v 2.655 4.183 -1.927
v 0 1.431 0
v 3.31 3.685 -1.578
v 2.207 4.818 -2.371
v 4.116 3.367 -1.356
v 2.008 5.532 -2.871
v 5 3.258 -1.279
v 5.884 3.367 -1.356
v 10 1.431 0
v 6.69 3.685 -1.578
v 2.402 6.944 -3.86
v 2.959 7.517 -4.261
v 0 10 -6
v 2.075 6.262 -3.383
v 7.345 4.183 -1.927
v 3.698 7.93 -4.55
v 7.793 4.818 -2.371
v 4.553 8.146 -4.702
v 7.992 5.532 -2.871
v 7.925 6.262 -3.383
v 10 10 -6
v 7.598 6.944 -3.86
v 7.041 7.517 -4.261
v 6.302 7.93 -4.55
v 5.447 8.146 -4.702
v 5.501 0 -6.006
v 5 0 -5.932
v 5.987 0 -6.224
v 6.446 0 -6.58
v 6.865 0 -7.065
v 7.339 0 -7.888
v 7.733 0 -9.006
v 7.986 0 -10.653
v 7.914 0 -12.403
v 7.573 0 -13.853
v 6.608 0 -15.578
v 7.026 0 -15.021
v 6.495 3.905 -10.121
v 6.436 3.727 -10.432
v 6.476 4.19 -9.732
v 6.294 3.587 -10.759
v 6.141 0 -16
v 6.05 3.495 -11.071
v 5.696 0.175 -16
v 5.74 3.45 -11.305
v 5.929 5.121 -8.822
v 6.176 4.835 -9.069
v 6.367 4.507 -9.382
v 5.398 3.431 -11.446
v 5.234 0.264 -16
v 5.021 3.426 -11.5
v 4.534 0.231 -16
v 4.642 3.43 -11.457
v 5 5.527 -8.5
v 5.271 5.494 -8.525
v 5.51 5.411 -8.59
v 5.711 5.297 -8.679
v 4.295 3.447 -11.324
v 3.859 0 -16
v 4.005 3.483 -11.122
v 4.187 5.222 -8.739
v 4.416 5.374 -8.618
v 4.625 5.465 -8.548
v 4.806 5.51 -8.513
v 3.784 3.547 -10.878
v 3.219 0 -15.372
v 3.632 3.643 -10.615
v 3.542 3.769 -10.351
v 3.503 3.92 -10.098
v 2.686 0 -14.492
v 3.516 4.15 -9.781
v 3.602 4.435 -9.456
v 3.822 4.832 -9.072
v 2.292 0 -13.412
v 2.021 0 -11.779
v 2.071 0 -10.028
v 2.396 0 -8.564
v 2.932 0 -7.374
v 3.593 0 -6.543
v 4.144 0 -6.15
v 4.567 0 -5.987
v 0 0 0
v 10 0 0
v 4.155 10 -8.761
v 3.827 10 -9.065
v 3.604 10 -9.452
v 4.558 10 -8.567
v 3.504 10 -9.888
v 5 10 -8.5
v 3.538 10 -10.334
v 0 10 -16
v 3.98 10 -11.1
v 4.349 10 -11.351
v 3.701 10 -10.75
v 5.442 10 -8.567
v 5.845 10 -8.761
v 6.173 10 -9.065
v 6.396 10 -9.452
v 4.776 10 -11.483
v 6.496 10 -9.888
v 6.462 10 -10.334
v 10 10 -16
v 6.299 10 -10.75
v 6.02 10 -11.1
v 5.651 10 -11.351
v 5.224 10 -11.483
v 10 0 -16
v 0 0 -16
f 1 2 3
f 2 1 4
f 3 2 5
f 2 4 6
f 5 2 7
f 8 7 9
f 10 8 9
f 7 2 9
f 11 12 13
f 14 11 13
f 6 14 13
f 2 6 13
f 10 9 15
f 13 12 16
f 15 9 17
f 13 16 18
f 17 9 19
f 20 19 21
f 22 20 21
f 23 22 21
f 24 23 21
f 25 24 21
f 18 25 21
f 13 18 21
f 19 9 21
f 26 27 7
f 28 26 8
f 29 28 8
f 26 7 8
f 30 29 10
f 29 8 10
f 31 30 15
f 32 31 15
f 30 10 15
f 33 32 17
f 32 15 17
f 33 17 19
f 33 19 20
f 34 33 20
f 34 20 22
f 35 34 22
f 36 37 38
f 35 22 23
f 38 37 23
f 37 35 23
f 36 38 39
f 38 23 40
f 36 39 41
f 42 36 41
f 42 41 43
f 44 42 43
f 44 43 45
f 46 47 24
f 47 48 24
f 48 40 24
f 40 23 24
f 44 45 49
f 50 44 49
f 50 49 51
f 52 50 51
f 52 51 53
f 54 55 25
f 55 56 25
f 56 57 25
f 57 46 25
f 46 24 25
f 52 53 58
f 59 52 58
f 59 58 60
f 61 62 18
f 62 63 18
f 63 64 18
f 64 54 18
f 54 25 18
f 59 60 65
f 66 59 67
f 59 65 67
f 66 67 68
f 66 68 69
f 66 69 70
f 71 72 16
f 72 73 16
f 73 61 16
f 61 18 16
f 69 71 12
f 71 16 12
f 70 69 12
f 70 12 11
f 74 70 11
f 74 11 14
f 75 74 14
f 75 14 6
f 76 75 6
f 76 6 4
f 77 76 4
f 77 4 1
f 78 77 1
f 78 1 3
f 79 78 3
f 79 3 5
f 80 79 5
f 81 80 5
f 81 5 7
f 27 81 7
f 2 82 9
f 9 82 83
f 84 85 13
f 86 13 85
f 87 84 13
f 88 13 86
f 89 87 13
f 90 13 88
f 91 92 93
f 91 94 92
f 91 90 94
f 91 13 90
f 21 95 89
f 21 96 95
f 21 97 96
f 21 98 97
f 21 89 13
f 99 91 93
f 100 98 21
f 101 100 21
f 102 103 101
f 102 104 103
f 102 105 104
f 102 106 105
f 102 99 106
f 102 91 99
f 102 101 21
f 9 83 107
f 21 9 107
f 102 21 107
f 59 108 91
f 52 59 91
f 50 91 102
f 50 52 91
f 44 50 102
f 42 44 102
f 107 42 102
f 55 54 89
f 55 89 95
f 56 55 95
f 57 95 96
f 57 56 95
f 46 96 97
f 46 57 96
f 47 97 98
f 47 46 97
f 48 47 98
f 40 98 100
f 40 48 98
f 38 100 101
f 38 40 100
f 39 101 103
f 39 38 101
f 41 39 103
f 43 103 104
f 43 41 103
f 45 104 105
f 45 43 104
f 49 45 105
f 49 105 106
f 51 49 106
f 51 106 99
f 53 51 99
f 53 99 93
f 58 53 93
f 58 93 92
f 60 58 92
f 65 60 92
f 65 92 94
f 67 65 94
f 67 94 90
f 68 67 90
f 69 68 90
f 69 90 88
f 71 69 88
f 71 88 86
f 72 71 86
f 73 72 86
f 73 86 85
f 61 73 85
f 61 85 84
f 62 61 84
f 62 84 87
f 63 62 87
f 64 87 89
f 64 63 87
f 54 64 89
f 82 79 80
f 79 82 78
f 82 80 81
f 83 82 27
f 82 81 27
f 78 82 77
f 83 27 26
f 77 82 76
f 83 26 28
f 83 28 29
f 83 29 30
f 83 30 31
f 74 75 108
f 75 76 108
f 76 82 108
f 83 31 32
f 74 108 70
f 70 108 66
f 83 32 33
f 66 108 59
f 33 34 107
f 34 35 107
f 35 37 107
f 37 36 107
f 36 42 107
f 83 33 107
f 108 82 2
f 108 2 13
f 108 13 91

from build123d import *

# Parameters (mm, degrees)
SKETCH_1_W          = 10
SKETCH_1_H          = 16
SKETCH_1_R          = 1.5
EXTRUDE_1_DEPTH     = 10
CUT_EXTRUDE_1_DEPTH = 10
SKETCH_3_R          = 3
CUT_EXTRUDE_2_DEPTH = 22.65119524


with BuildPart() as part:
    # 草图1 → 凸台-拉伸1 (new body)
    with BuildSketch(Plane(origin=(0, 0, 0), x_dir=(1, 0, 0), z_dir=(0, 1, 0))):
        with Locations((5, 8)):
            Rectangle(SKETCH_1_W, SKETCH_1_H)
        with Locations(Location((5, 10, 0), (0, 0, 270))):
            Circle(SKETCH_1_R, mode=Mode.SUBTRACT)
    extrude(amount=EXTRUDE_1_DEPTH)

    # 草图2 → 切除-拉伸1 (cut)
    with BuildSketch(Plane(origin=(10, 0, 0), x_dir=(0, 0, -1), z_dir=(1, 0, 0))):
        Polygon((0, 1.43111196), (6, 10), (0, 10), align=None)
    extrude(amount=-CUT_EXTRUDE_1_DEPTH, mode=Mode.SUBTRACT)

    # 草图3 → 切除-拉伸2 (cut, through all)
    with BuildSketch(Plane(origin=(0, 0.470821421, 0.672402674), x_dir=(1, 0, 0), z_dir=(0, 0.5735764363510438, 0.8191520442889935))):
        with Locations(Location((5, 6.402638674, 0), (0, 0, 270))):
            Circle(SKETCH_3_R)
    extrude(amount=-CUT_EXTRUDE_2_DEPTH, mode=Mode.SUBTRACT)


solid = part.part
